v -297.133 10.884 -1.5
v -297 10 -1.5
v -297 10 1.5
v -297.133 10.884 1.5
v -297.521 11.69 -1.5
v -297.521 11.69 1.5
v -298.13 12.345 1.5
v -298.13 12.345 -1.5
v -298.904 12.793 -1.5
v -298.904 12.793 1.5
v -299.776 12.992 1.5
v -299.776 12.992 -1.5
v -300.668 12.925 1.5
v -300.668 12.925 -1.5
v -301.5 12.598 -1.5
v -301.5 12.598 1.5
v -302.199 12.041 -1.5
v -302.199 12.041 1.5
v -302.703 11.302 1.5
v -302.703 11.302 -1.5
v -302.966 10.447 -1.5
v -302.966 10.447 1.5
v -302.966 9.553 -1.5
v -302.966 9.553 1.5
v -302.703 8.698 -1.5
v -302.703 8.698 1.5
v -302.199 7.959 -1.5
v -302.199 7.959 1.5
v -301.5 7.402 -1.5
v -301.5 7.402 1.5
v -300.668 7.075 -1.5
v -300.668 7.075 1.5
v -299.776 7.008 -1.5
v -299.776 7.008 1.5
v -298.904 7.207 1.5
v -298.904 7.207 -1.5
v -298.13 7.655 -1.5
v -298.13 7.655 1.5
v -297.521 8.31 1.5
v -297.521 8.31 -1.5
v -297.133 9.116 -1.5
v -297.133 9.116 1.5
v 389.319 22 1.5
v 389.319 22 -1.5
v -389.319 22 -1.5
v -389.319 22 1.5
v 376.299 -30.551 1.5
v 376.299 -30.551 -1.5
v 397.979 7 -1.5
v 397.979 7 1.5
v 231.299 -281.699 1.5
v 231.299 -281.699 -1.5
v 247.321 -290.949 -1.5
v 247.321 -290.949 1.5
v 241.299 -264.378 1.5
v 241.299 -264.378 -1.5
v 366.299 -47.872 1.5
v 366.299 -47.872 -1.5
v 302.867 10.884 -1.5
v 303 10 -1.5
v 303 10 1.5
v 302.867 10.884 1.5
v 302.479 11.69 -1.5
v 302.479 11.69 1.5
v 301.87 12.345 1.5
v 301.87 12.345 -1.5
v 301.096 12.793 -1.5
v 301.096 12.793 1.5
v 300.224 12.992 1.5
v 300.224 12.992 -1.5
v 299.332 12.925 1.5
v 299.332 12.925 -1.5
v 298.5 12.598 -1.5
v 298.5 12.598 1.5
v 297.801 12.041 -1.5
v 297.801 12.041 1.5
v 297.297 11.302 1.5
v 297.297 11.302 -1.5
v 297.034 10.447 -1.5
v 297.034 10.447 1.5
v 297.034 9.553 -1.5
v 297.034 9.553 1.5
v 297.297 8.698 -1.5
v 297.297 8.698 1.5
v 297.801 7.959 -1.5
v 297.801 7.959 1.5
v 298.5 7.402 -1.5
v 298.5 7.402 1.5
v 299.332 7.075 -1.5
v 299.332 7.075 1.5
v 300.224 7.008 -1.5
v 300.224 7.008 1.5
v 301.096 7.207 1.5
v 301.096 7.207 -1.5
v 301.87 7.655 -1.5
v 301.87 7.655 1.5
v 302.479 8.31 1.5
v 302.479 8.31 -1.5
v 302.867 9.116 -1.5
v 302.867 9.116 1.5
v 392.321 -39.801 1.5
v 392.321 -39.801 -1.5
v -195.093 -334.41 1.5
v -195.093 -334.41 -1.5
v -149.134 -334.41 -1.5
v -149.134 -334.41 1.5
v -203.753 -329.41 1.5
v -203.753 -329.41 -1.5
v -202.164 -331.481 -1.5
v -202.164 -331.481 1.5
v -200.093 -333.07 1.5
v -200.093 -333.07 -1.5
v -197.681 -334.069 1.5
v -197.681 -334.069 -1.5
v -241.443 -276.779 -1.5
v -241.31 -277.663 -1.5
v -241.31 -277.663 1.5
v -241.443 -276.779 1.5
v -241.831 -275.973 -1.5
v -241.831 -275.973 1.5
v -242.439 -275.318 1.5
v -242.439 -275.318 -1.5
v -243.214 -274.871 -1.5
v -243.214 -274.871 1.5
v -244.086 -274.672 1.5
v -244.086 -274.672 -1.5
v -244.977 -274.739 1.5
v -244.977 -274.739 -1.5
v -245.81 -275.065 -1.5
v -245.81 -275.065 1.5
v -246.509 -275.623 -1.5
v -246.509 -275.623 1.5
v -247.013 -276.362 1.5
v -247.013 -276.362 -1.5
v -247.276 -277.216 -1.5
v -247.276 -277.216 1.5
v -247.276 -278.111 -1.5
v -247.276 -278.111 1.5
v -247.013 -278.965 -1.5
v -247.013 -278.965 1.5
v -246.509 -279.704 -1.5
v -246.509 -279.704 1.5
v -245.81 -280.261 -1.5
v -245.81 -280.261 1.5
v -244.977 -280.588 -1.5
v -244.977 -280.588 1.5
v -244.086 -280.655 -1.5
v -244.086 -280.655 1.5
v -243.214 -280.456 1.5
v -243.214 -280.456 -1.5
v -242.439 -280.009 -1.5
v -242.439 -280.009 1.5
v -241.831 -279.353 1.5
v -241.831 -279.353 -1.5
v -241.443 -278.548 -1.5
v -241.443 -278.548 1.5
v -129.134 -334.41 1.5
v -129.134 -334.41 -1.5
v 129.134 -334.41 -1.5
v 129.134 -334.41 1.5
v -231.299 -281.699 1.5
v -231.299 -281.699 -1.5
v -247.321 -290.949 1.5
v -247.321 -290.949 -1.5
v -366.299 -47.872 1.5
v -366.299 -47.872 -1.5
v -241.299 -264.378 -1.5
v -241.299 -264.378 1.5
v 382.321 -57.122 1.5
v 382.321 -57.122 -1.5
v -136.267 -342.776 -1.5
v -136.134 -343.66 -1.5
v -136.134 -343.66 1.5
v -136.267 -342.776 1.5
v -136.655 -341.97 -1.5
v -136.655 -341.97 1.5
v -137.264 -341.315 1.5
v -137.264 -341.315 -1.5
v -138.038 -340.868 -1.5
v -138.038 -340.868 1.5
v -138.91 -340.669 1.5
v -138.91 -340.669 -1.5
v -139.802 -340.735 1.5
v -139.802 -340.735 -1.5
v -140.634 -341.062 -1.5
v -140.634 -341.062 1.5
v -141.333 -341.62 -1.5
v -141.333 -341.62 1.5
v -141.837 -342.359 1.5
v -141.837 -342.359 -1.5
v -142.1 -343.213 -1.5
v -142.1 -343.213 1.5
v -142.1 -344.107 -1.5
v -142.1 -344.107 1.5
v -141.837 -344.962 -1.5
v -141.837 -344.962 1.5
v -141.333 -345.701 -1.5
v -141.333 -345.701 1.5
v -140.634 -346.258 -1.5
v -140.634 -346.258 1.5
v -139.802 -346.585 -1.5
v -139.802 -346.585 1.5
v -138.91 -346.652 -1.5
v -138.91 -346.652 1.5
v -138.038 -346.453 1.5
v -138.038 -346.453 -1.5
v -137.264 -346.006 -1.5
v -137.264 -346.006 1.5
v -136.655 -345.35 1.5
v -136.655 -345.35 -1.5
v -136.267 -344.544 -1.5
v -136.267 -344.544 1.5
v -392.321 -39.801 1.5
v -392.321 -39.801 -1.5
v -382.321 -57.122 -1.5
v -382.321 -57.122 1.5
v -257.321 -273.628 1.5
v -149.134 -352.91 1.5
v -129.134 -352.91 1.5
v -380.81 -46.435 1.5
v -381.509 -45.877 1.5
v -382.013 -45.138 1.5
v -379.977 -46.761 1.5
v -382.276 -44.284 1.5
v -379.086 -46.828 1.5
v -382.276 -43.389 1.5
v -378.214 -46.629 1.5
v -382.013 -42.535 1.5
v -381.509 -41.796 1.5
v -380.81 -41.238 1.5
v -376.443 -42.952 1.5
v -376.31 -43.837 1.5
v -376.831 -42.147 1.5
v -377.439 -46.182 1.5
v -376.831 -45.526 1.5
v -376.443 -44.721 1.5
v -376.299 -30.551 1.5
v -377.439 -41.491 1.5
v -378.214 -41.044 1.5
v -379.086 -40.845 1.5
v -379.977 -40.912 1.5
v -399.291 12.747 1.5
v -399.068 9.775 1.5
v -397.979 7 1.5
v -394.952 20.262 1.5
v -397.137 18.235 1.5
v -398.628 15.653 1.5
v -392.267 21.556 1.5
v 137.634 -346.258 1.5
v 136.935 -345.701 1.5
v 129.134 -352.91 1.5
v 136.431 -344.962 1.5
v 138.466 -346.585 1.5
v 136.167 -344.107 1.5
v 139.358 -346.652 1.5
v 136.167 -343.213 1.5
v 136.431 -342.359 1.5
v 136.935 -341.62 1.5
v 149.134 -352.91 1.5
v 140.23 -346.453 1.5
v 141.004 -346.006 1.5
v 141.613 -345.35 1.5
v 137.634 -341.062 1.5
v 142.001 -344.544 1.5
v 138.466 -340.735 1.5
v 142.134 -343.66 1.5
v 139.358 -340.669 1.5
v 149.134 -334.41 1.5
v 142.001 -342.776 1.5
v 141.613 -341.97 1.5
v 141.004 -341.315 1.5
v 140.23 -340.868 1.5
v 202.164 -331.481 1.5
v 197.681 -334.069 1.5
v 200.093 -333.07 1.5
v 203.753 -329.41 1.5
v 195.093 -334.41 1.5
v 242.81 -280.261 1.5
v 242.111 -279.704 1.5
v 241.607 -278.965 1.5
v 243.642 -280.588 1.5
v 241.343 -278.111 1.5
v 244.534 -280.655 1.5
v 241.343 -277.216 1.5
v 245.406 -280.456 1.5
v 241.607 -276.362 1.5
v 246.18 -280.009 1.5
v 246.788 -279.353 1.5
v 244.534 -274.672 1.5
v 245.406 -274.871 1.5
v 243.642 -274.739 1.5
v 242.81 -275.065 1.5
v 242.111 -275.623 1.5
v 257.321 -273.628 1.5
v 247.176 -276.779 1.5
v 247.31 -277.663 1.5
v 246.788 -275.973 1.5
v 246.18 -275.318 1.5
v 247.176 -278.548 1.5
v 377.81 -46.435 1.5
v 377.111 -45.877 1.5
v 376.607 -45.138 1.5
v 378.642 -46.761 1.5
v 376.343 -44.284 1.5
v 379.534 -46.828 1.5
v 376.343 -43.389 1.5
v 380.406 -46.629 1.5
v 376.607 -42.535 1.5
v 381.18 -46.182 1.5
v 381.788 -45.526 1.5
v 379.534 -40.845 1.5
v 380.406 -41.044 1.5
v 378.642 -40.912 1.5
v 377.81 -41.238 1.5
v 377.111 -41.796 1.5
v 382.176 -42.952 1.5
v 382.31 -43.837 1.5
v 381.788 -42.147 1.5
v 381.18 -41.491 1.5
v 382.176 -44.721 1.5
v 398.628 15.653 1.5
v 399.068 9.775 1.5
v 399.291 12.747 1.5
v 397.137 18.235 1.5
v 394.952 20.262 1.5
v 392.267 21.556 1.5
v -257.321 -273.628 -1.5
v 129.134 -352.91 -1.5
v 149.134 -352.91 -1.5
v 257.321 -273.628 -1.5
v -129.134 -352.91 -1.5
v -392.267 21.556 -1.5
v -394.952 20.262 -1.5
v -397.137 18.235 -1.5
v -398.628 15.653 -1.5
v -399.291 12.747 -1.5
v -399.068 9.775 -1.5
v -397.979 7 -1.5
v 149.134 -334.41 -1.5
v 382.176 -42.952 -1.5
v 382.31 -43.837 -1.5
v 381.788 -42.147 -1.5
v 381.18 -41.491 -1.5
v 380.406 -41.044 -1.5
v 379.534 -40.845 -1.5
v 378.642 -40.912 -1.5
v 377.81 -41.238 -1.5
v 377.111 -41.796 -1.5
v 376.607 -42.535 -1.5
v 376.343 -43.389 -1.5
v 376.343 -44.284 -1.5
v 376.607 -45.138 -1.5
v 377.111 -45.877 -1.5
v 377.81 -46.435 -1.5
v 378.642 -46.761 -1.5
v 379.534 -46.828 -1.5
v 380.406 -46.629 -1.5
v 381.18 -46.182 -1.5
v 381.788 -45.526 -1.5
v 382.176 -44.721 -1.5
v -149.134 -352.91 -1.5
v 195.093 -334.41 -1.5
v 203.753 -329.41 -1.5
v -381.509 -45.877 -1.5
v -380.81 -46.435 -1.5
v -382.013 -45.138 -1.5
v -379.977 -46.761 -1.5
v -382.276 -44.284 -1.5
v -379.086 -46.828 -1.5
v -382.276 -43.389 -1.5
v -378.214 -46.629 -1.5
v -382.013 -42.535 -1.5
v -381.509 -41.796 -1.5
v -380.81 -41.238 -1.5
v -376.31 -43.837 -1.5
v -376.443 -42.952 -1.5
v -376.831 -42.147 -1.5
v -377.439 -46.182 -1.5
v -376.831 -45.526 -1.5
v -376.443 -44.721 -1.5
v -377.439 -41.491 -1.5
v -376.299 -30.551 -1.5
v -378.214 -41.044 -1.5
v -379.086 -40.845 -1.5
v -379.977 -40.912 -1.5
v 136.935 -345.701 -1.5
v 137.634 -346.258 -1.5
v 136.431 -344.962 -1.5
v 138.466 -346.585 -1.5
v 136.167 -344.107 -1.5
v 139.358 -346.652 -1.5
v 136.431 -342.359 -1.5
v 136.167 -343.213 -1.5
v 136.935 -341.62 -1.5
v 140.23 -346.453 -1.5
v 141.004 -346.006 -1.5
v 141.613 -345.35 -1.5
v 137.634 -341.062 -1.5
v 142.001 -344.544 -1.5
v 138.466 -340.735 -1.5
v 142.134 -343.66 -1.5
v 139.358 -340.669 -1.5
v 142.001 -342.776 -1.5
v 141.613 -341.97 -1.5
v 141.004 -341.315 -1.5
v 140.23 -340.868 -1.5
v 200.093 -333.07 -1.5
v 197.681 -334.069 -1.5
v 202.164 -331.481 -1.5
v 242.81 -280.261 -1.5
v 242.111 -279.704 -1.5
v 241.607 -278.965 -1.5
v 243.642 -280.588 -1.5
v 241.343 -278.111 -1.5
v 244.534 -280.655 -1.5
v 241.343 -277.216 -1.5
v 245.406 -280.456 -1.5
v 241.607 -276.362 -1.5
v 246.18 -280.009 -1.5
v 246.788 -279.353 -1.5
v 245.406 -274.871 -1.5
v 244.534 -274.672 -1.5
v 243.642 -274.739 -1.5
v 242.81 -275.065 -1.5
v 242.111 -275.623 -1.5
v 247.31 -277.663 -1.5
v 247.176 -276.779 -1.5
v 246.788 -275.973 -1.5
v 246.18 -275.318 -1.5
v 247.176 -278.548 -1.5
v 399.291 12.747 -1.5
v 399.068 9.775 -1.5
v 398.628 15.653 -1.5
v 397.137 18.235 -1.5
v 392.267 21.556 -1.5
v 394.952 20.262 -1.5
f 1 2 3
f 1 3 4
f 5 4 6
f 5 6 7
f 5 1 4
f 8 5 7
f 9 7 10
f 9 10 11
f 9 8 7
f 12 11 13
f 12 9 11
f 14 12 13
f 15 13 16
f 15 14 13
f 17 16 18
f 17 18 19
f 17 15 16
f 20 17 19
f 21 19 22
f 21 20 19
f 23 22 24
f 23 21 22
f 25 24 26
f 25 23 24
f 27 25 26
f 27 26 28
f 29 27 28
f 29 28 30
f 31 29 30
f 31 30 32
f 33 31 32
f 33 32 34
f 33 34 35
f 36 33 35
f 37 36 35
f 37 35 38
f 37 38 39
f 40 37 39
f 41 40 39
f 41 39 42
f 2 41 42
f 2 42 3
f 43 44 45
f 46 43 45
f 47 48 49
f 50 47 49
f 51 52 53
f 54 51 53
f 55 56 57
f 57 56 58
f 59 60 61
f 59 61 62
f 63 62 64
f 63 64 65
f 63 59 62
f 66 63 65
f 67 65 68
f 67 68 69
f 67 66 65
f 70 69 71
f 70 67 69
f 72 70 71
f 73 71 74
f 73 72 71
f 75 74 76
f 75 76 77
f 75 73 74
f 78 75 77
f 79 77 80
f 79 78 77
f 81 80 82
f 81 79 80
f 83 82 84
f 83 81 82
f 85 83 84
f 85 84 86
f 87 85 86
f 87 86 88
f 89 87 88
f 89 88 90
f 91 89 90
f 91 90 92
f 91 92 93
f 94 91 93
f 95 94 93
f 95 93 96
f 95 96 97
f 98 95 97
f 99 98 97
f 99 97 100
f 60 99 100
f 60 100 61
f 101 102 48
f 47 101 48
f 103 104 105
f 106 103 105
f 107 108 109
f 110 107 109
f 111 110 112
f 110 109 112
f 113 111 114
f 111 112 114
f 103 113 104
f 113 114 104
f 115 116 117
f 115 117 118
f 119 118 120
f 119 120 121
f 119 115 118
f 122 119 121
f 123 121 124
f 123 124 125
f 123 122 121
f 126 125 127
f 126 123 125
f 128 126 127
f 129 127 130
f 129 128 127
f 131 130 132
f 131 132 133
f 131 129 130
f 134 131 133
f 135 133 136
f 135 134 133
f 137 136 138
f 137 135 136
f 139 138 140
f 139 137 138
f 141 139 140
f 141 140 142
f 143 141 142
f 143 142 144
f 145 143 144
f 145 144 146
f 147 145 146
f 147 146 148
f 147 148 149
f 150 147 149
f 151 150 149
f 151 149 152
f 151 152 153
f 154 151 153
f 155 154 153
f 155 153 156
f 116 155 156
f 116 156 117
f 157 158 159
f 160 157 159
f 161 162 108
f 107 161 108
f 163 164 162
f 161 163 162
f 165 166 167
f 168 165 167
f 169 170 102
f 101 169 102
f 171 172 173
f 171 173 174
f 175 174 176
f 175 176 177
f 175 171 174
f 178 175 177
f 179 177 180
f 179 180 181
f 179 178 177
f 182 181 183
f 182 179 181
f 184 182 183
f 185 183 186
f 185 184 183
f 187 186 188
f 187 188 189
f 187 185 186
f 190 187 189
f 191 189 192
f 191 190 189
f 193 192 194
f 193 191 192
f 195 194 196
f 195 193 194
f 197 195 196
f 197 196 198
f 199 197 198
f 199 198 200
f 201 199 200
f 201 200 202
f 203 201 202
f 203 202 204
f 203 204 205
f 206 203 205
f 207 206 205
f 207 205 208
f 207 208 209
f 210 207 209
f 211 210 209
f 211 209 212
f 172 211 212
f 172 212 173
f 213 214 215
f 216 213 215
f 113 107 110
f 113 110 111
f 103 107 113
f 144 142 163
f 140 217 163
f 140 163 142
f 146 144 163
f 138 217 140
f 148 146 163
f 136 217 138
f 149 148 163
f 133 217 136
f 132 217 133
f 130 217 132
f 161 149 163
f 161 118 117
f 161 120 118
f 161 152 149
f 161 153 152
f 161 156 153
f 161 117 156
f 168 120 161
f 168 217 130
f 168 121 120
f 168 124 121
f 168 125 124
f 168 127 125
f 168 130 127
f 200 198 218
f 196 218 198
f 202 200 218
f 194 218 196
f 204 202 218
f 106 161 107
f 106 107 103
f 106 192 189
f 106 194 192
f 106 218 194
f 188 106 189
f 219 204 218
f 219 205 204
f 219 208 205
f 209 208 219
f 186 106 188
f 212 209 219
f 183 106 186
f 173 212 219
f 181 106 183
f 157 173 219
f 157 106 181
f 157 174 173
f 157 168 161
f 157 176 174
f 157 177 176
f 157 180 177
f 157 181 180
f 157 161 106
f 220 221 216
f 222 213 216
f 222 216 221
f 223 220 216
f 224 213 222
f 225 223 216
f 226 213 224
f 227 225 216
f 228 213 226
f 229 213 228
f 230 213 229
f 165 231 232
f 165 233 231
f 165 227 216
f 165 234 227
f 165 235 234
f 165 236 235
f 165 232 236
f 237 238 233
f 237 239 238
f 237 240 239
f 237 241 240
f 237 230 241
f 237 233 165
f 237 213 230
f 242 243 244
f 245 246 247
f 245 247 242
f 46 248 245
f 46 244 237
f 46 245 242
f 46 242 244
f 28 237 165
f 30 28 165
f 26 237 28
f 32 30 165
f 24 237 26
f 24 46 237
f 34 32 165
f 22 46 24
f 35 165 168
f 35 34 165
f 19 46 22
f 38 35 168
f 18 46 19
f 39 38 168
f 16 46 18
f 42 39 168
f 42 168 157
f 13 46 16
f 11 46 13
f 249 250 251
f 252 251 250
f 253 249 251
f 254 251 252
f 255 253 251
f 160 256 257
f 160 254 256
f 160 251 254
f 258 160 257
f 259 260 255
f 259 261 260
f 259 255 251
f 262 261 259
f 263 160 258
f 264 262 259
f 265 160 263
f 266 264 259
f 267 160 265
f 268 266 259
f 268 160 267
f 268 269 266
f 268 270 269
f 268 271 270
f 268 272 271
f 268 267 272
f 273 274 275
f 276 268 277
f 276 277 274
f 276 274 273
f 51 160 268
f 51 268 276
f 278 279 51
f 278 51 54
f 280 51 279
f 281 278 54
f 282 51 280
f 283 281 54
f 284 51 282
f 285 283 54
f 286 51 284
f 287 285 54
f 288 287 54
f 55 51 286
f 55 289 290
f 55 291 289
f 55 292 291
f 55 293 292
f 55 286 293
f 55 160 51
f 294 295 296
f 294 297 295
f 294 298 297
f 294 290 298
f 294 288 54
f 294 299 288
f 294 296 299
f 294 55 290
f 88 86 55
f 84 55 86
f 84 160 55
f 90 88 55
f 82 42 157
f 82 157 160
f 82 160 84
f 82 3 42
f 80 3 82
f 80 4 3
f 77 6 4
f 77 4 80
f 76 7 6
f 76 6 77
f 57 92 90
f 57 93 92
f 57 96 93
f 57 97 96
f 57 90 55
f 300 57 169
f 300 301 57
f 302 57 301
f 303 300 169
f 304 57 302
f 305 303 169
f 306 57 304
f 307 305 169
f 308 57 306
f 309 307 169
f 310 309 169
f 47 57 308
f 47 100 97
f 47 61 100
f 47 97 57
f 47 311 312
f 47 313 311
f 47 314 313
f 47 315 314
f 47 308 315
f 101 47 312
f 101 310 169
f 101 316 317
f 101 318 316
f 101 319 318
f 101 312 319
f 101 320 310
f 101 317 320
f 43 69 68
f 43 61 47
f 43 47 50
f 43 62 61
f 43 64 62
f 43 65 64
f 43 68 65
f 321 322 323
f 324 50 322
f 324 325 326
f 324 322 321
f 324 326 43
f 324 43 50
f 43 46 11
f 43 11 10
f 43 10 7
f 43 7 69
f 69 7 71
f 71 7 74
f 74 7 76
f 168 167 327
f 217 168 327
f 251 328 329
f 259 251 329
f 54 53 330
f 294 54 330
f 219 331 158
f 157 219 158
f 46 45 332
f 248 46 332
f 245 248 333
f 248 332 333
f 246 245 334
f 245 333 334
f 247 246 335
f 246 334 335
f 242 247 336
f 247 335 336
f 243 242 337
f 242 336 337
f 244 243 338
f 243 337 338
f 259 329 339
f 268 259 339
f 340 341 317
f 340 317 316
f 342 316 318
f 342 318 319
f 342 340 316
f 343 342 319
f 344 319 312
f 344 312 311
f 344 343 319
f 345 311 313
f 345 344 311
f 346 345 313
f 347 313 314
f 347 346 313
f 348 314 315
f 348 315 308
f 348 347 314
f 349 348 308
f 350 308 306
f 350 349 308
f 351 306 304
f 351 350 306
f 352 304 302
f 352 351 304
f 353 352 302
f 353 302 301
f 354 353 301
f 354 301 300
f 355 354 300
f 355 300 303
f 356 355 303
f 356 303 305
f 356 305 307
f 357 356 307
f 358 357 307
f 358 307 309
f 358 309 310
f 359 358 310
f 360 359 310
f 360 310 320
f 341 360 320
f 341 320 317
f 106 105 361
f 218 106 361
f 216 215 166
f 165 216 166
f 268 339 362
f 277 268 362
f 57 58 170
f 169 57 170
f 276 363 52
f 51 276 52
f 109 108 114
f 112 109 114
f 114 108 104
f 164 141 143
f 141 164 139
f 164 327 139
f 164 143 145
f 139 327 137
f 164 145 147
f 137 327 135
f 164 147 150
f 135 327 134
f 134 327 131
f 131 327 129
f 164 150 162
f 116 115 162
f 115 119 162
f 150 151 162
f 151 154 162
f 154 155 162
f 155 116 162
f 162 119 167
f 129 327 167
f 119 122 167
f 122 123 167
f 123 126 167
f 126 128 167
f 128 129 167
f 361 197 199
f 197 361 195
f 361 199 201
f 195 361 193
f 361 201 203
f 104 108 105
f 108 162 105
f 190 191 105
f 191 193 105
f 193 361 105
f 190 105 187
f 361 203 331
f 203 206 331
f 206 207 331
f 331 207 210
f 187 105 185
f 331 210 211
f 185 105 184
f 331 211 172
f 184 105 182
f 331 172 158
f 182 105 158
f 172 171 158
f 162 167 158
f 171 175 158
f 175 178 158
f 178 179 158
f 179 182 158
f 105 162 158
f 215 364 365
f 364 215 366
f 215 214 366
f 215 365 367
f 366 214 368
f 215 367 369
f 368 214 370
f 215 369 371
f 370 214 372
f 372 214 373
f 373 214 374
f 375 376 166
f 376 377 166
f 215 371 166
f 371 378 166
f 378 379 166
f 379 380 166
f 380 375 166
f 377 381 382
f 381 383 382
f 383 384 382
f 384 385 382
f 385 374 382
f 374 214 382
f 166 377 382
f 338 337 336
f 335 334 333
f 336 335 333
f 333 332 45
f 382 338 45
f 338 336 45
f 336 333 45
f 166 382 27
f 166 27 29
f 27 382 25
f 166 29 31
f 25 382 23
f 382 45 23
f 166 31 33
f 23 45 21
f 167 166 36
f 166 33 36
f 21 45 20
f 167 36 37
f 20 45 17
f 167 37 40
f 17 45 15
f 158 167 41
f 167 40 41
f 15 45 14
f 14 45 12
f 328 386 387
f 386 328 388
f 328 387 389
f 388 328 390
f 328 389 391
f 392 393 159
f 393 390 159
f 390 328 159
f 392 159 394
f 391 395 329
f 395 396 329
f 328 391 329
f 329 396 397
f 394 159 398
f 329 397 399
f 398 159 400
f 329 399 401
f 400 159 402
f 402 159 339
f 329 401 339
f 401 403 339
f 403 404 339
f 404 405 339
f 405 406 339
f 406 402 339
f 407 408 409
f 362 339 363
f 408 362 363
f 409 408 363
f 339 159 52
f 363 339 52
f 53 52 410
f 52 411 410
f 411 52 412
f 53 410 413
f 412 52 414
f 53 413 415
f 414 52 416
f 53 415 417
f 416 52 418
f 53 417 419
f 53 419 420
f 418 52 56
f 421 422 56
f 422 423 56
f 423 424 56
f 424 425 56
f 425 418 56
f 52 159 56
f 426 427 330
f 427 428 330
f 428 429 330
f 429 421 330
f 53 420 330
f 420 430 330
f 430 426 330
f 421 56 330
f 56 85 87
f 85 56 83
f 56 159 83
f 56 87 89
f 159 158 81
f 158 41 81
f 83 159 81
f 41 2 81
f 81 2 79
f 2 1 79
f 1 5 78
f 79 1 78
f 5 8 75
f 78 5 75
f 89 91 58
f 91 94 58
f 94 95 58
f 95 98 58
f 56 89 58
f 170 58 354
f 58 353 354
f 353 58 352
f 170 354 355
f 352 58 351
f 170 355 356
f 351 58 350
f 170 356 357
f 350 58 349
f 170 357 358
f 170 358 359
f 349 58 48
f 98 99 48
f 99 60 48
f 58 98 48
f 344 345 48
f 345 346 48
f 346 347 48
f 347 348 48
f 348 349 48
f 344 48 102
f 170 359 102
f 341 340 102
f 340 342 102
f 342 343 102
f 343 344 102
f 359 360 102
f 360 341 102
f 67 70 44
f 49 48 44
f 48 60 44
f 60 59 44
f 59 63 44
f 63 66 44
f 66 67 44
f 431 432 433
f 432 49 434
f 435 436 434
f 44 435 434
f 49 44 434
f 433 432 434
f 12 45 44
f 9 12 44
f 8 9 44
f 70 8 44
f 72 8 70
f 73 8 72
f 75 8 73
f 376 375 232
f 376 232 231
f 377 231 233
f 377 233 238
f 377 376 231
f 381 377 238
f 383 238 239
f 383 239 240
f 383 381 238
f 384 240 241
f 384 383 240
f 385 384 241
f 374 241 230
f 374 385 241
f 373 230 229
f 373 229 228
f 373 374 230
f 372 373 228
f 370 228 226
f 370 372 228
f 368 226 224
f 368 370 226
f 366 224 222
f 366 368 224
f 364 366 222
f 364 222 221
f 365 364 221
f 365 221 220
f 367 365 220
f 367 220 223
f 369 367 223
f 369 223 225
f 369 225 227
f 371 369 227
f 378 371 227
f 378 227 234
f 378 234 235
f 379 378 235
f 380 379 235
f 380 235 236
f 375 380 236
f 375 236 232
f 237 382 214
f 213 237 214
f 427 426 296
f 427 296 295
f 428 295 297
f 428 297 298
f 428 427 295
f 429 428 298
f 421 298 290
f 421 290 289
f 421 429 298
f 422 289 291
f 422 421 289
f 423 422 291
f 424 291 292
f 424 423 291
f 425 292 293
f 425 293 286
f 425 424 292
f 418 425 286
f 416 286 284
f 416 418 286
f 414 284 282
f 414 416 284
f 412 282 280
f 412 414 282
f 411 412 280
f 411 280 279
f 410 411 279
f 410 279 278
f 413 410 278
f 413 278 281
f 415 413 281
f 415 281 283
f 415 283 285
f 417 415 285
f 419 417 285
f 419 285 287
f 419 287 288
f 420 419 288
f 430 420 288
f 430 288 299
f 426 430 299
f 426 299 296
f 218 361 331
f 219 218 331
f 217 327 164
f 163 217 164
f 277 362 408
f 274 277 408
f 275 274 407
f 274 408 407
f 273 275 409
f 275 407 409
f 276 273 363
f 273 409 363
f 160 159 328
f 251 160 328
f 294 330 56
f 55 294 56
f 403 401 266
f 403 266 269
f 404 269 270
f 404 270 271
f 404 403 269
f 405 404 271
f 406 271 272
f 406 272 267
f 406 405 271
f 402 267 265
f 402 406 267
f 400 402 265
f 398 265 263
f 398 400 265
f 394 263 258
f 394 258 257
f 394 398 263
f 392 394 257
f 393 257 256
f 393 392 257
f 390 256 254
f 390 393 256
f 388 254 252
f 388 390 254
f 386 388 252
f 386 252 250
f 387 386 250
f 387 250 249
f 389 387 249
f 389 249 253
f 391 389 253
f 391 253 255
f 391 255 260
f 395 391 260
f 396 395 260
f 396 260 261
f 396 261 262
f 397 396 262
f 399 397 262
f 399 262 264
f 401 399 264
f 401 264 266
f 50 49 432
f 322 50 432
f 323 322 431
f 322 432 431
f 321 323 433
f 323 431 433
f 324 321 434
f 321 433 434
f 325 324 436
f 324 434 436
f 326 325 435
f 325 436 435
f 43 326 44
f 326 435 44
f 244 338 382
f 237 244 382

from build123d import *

# Parameters (mm, degrees)
SKETCH_1_R              = 3
EXTRUDE_1_DEPTH         = 1.5
SHEET_START             = -1.5
SHEET_METAL_1_OUTLINE_R = 3
SHEET_METAL_1_DEPTH     = 1.5


# Read off the part's stored shape, not the designer's step: Преобразовать-Твердое тело1
with BuildPart() as part:
    # Sketch 1 → Бобышка-Вытянуть1 (new body)
    with BuildSketch(Plane.XY):
        with BuildLine():
            Line((389.31902002, 22), (-389.31902002, 22))
            ThreePointArc((-389.31902002, 22), (-397.979274058, 17), (-397.979274058, 7))
            Line((-397.979274058, 7), (-376.299038106, -30.551270189))
            Line((-376.299038106, -30.551270189), (-392.320508076, -39.801270189))
            Line((-392.320508076, -39.801270189), (-382.320508076, -57.121778265))
            Line((-382.320508076, -57.121778265), (-366.299038106, -47.871778265))
            Line((-366.299038106, -47.871778265), (-241.299038106, -264.378129211))
            Line((-241.299038106, -264.378129211), (-257.320508076, -273.628129211))
            Line((-257.320508076, -273.628129211), (-247.320508076, -290.948637287))
            Line((-247.320508076, -290.948637287), (-231.299038106, -281.698637287))
            Line((-231.299038106, -281.698637287), (-203.75277675, -329.410161514))
            ThreePointArc((-203.75277675, -329.410161514), (-200.092522712, -333.070415552), (-195.092522712, -334.410161514))
            Line((-195.092522712, -334.410161514), (-149.133974596, -334.410161514))
            Line((-149.133974596, -334.410161514), (-149.133974596, -352.910161514))
            Line((-149.133974596, -352.910161514), (-129.133974596, -352.910161514))
            Line((-129.133974596, -352.910161514), (-129.133974596, -334.410161514))
            Line((-129.133974596, -334.410161514), (129.133974596, -334.410161514))
            Line((129.133974596, -334.410161514), (129.133974596, -352.910161514))
            Line((129.133974596, -352.910161514), (149.133974596, -352.910161514))
            Line((149.133974596, -352.910161514), (149.133974596, -334.410161514))
            Line((149.133974596, -334.410161514), (195.092522712, -334.410161514))
            ThreePointArc((195.092522712, -334.410161514), (200.092522712, -333.070415552), (203.75277675, -329.410161514))
            Line((203.75277675, -329.410161514), (231.299038106, -281.698637287))
            Line((231.299038106, -281.698637287), (247.320508076, -290.948637287))
            Line((247.320508076, -290.948637287), (257.320508076, -273.628129211))
            Line((257.320508076, -273.628129211), (241.299038106, -264.378129211))
            Line((241.299038106, -264.378129211), (366.299038106, -47.871778265))
            Line((366.299038106, -47.871778265), (382.320508076, -57.121778265))
            Line((382.320508076, -57.121778265), (392.320508076, -39.801270189))
            Line((392.320508076, -39.801270189), (376.299038106, -30.551270189))
            Line((376.299038106, -30.551270189), (397.979274058, 7))
            ThreePointArc((397.979274058, 7), (397.979274058, 17), (389.31902002, 22))
        make_face()
        with Locations((244.309773091, -277.663383249)):
            Circle(SKETCH_1_R, mode=Mode.SUBTRACT)
        with Locations((379.309773091, -43.836524227)):
            Circle(SKETCH_1_R, mode=Mode.SUBTRACT)
        with Locations((139.133974596, -343.660161514)):
            Circle(SKETCH_1_R, mode=Mode.SUBTRACT)
        with Locations((-139.133974596, -343.660161514)):
            Circle(SKETCH_1_R, mode=Mode.SUBTRACT)
        with Locations((-244.309773091, -277.663383249)):
            Circle(SKETCH_1_R, mode=Mode.SUBTRACT)
        with Locations((-379.309773091, -43.836524227)):
            Circle(SKETCH_1_R, mode=Mode.SUBTRACT)
        with Locations((300, 10)):
            Circle(SKETCH_1_R, mode=Mode.SUBTRACT)
        with Locations((-300, 10)):
            Circle(SKETCH_1_R, mode=Mode.SUBTRACT)
    extrude(amount=EXTRUDE_1_DEPTH)

    # Sheet Metal 1 outline → Sheet Metal 1 (add)
    with BuildSketch(Plane.XY.offset(SHEET_START)):
        with BuildLine():
            Line((-149.133974596, -334.410161514), (-149.133974596, -352.910161514))
            Line((-149.133974596, -352.910161514), (-129.133974596, -352.910161514))
            Line((-129.133974596, -352.910161514), (-129.133974596, -334.410161514))
            Line((-129.133974596, -334.410161514), (129.133974596, -334.410161514))
            Line((129.133974596, -334.410161514), (129.133974596, -352.910161514))
            Line((129.133974596, -352.910161514), (149.133974596, -352.910161514))
            Line((149.133974596, -352.910161514), (149.133974596, -334.410161514))
            Line((149.133974596, -334.410161514), (195.092522712, -334.410161514))
            ThreePointArc((195.092522712, -334.410161514), (200.092522712, -333.070415552), (203.75277675, -329.410161514))
            Line((203.75277675, -329.410161514), (231.299038106, -281.698637287))
            Line((231.299038106, -281.698637287), (247.320508076, -290.948637287))
            Line((247.320508076, -290.948637287), (257.320508076, -273.628129211))
            Line((257.320508076, -273.628129211), (241.299038106, -264.378129211))
            Line((241.299038106, -264.378129211), (366.299038106, -47.871778265))
            Line((366.299038106, -47.871778265), (382.320508076, -57.121778265))
            Line((382.320508076, -57.121778265), (392.320508076, -39.801270189))
            Line((392.320508076, -39.801270189), (376.299038106, -30.551270189))
            Line((376.299038106, -30.551270189), (397.979274058, 7))
            ThreePointArc((397.979274058, 7), (397.979274058, 17), (389.31902002, 22))
            Line((389.31902002, 22), (-389.31902002, 22))
            ThreePointArc((-389.31902002, 22), (-397.979274058, 17), (-397.979274058, 7))
            Line((-397.979274058, 7), (-376.299038106, -30.551270189))
            Line((-376.299038106, -30.551270189), (-392.320508076, -39.801270189))
            Line((-392.320508076, -39.801270189), (-382.320508076, -57.121778265))
            Line((-382.320508076, -57.121778265), (-366.299038106, -47.871778265))
            Line((-366.299038106, -47.871778265), (-241.299038106, -264.378129211))
            Line((-241.299038106, -264.378129211), (-257.320508076, -273.628129211))
            Line((-257.320508076, -273.628129211), (-247.320508076, -290.948637287))
            Line((-247.320508076, -290.948637287), (-231.299038106, -281.698637287))
            Line((-231.299038106, -281.698637287), (-203.75277675, -329.410161514))
            ThreePointArc((-203.75277675, -329.410161514), (-200.092522712, -333.070415552), (-195.092522712, -334.410161514))
            Line((-195.092522712, -334.410161514), (-149.133974596, -334.410161514))
        make_face()
        with Locations((-244.309773091, -277.663383249)):
            Circle(SHEET_METAL_1_OUTLINE_R, mode=Mode.SUBTRACT)
        with Locations((-139.133974596, -343.660161514)):
            Circle(SHEET_METAL_1_OUTLINE_R, mode=Mode.SUBTRACT)
        with Locations((139.133974596, -343.660161514)):
            Circle(SHEET_METAL_1_OUTLINE_R, mode=Mode.SUBTRACT)
        with Locations((244.309773091, -277.663383249)):
            Circle(SHEET_METAL_1_OUTLINE_R, mode=Mode.SUBTRACT)
        with Locations((-379.309773091, -43.836524227)):
            Circle(SHEET_METAL_1_OUTLINE_R, mode=Mode.SUBTRACT)
        with Locations((-300, 10)):
            Circle(SHEET_METAL_1_OUTLINE_R, mode=Mode.SUBTRACT)
        with Locations((379.309773091, -43.836524227)):
            Circle(SHEET_METAL_1_OUTLINE_R, mode=Mode.SUBTRACT)
        with Locations((300, 10)):
            Circle(SHEET_METAL_1_OUTLINE_R, mode=Mode.SUBTRACT)
    extrude(amount=SHEET_METAL_1_DEPTH)


solid = part.part
